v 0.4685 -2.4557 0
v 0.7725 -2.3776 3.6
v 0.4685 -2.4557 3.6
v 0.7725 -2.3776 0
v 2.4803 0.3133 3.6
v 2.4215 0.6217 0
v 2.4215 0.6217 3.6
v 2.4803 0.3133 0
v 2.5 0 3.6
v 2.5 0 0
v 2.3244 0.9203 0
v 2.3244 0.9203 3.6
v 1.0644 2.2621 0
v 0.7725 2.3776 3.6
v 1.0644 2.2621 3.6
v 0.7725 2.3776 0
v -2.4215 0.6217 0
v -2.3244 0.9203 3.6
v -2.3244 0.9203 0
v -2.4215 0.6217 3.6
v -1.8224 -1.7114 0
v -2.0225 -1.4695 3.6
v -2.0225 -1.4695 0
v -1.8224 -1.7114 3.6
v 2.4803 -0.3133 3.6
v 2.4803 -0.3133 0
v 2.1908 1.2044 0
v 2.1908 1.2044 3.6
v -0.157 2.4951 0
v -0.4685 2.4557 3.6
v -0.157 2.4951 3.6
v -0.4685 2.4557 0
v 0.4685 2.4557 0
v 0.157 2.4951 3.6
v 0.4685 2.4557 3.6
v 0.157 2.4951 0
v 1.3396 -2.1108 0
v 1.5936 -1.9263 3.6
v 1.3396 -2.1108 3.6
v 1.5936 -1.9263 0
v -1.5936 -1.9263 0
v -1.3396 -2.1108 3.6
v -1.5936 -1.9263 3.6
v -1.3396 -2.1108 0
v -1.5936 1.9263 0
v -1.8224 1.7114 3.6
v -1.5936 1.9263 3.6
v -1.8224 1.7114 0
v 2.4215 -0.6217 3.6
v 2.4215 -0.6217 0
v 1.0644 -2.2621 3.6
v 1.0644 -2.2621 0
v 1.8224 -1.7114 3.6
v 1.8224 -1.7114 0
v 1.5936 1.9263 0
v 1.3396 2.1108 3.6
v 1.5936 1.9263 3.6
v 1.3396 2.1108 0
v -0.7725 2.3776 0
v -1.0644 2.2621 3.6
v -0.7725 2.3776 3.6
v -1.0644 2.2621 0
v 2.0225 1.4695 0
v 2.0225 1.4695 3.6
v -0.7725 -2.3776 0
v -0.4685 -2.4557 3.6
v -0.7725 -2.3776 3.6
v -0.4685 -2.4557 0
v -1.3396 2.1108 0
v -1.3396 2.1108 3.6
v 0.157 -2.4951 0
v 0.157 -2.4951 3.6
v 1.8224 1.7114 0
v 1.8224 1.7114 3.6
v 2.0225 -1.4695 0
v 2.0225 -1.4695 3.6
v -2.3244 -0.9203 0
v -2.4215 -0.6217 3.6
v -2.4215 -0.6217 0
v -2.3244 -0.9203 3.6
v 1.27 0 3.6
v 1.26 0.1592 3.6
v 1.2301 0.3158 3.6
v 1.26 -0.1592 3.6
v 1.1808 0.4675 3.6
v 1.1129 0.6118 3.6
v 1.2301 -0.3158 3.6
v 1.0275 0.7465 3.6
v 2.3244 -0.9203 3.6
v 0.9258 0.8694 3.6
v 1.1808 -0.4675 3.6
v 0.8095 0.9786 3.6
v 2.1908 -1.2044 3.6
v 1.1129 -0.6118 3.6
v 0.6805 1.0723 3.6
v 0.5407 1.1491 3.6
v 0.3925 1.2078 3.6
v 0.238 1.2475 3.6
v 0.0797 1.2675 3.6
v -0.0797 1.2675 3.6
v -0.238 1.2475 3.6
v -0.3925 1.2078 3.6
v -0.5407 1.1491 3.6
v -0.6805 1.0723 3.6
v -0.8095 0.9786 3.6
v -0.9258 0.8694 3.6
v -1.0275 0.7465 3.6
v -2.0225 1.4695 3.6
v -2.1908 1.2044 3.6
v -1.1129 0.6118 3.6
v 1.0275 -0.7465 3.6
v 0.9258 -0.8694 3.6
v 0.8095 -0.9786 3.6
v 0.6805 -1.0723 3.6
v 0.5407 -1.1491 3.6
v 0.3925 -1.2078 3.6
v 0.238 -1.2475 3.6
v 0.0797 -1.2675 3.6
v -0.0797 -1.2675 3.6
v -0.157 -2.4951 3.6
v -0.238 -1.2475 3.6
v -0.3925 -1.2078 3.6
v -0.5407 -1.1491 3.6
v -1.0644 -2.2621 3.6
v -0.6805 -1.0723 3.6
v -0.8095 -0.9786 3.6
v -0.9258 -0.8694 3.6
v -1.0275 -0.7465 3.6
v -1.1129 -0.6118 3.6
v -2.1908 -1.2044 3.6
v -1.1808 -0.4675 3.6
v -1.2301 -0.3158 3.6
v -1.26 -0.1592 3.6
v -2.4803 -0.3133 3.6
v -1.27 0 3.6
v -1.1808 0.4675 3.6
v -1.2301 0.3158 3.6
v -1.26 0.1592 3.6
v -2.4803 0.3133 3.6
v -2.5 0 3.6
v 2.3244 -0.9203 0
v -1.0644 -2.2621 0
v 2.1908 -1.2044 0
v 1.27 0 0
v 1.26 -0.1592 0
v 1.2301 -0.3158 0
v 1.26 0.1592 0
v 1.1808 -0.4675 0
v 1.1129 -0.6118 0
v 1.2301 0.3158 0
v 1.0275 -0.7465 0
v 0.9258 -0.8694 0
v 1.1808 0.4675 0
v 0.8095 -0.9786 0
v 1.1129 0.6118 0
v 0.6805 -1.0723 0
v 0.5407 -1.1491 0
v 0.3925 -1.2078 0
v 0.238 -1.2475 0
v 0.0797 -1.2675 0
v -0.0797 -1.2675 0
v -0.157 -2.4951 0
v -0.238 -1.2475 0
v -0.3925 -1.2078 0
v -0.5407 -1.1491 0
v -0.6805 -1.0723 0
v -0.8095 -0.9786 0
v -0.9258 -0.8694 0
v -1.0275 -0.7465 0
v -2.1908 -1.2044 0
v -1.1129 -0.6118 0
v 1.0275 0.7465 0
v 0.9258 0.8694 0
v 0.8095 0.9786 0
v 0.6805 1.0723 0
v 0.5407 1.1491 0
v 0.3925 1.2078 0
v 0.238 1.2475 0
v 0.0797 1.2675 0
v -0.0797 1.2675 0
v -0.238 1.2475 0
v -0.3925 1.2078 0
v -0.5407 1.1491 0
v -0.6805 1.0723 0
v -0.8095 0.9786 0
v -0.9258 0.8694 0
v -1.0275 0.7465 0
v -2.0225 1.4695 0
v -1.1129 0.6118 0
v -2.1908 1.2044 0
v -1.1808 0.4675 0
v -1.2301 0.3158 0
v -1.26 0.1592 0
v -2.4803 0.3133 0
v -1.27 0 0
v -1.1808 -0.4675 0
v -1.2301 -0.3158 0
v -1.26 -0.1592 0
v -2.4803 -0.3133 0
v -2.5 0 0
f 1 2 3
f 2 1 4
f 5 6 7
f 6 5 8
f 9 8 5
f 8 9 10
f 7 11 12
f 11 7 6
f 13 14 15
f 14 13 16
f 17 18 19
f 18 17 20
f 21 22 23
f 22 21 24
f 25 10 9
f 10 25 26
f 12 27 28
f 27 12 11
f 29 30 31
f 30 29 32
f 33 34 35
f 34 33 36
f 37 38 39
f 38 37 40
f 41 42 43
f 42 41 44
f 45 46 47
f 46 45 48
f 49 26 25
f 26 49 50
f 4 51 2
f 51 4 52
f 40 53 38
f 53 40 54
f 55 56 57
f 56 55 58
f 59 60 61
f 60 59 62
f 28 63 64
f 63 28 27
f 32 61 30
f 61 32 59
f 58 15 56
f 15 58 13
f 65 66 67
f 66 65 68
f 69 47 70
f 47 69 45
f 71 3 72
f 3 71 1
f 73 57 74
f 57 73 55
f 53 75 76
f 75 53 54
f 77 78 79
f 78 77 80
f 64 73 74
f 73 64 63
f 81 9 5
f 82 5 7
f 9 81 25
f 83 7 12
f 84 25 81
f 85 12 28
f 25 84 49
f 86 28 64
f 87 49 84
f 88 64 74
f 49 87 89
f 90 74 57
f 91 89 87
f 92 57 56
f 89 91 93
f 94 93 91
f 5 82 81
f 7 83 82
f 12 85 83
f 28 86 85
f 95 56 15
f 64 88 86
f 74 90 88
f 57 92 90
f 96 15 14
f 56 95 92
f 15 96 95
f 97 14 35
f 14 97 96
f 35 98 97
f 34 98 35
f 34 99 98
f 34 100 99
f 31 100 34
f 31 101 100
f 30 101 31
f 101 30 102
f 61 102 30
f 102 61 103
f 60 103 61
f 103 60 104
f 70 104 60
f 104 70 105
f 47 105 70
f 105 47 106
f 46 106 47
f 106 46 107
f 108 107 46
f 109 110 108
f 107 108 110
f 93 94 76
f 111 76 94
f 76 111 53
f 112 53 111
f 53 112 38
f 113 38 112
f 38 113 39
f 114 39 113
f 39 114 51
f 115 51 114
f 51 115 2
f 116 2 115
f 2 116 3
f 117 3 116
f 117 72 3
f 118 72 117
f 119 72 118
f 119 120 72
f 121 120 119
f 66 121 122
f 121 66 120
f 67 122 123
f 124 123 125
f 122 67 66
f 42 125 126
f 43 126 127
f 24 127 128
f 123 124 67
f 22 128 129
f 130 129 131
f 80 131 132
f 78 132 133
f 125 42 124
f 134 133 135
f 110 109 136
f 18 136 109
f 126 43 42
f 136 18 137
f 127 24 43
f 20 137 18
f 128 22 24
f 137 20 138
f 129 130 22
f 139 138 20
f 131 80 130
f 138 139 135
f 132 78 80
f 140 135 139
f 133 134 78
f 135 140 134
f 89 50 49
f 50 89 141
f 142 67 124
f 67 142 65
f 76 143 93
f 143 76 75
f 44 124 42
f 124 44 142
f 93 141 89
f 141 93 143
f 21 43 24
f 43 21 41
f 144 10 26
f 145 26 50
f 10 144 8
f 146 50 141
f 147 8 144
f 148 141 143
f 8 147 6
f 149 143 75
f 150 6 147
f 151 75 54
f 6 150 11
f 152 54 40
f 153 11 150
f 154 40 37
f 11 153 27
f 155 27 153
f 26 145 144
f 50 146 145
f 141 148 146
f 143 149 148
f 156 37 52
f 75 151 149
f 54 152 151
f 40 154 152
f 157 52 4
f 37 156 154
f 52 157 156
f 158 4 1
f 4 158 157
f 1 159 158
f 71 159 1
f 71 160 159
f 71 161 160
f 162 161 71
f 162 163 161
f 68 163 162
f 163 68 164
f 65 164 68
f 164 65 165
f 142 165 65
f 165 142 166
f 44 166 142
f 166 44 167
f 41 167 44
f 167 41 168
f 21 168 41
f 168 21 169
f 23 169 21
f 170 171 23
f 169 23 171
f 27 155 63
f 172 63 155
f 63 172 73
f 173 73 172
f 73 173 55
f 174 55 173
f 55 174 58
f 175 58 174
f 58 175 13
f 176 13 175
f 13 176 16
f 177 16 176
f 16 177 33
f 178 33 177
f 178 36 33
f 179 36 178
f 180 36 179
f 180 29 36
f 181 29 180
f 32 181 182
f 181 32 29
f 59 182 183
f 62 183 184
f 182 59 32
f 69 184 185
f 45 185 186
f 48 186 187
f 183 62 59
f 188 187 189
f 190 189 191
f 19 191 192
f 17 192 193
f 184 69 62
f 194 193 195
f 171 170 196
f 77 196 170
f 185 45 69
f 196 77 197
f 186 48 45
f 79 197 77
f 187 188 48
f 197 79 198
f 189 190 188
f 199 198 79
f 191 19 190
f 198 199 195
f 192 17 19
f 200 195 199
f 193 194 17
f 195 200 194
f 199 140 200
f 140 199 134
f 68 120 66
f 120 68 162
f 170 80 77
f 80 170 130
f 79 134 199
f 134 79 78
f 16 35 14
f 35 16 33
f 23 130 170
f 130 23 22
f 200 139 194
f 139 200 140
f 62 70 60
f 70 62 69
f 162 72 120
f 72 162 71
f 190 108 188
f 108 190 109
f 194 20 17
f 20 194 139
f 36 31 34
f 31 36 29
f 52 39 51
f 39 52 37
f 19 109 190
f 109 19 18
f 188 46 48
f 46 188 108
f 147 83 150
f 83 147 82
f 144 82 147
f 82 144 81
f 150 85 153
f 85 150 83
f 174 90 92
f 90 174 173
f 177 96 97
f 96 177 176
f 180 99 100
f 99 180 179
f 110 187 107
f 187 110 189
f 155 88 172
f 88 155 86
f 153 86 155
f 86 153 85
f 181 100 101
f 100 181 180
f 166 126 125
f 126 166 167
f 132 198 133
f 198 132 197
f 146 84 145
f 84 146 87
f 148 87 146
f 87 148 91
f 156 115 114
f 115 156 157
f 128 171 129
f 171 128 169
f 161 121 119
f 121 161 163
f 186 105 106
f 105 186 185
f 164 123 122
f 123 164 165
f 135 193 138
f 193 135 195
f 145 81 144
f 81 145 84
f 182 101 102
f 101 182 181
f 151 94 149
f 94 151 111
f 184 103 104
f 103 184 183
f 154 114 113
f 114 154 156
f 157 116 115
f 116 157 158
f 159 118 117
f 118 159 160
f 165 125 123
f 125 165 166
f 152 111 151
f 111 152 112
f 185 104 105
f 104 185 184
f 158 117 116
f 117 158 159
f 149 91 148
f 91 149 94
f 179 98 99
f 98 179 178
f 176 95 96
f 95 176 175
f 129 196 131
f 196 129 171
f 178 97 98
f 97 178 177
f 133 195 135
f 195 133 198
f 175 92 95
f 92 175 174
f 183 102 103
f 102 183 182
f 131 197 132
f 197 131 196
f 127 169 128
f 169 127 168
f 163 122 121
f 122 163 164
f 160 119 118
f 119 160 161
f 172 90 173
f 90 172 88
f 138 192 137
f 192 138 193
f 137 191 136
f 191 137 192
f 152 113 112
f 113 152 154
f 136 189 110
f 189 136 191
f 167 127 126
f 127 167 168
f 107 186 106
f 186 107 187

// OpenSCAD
// file: board_config.scad
rail_position=20;
rail_height=2.5;
rail_width=5;
mainboard_width=60;
mainboard_height=130;
mainboard_thickness=4;
mainboard_spacing=10;
deep_holes_spacing=10;
rails=4;


board_attacher_width=4;
board_attacher_height=55;
board_attacher_length=30;

side_panel_height = board_attacher_height + 2*mainboard_thickness;
side_panel_thickness=2;
side_panel_ticks=2;

front_panel_height = board_attacher_height + 2*mainboard_thickness;
front_panel_thickness=2;
front_panel_ticks=2;
front_panel_width = mainboard_height + 2*side_panel_thickness;
// file: display_support_config.scad
display_support_thickness=3;
display_support_spacing = 3.6;
display_support_screen_height=5;
display_support_shift_x=5;
// file: dovetail.scad
module dovetail_shape(width, height, length) {
    translate([-width/2,0,0]) linear_extrude(height = length) {
        polygon([[0, 0], [width, 0], [width - width/3, height], [width/3, height]]);
    }
}

module rail(male=false, width, height, length, default_offset=0.2) {
    // male will reduce the width slightly
    offset = male ? default_offset : 0;
    
    translate([0,0,-height+offset]) rotate([90,0,0]) dovetail_shape(width-2*offset,height-offset,length);
}
// file: generic_board.scad
include <dovetail.scad>;
include <board_config.scad>;
include <common.scad>;


hole_spacing=10;
front_back_holes_depth=10;

module generic_board_attacher_mating() {
    difference() {
        cube([board_attacher_width,board_attacher_length,board_attacher_height]);
        // non attaching holes
        
        for (z=[1:board_attacher_height/(hole_spacing/2)-1]) translate([0,0,hole_spacing/2*z]) union() {
            /*for (i=[1:board_attacher_length/hole_spacing-1]) 
                translate([-margin,hole_spacing*i,0]) rotate([0,90,0]) 
                    cylinder(board_attacher_width+2*margin,d=bigscrew_diameter, $fn=50);*/
            for (i=[1:board_attacher_length/(hole_spacing/2)]) 
                translate([-margin,hole_spacing*i/2-hole_spacing/4,0]) rotate([0,90,0]) 
                    cylinder(board_attacher_width+2*margin,d=bigscrew_attach_hole_diameter, $fn=50);                
        }
        // vertical attaching holes
        for (i=[1:board_attacher_height/(hole_spacing/2)-1]) 
            union() {
                translate([board_attacher_width/2,front_back_holes_depth+margin,hole_spacing*i/2]) rotate([90,00,0]) 
                    cylinder(front_back_holes_depth+2*margin,d=bigscrew_attach_hole_diameter, $fn=50);             
                translate([board_attacher_width/2,board_attacher_length+margin,hole_spacing*i/2]) rotate([90,00,0]) 
                    cylinder(front_back_holes_depth+2*margin,d=bigscrew_attach_hole_diameter, $fn=50);             
            }
                
    }
}

module generic_board_attacher() {
    union() {
        generic_board_attacher_mating();
        translate([board_attacher_width/2,board_attacher_length,0]) rail(true, rail_width, rail_height, board_attacher_length);  
        translate([board_attacher_width/2,board_attacher_length,board_attacher_height]) rotate([0,180,0]) rail(true, rail_width, rail_height, board_attacher_length);  
    }
}

//generic_board_attacher();
// file: display.scad
include <display_config.scad>

module display_holes_row() {
    $fn=50;
    translate([display_hole_x_offset,display_hole_y_offset,-cut_limit]) cylinder(h=20,d=display_hole_size);
    translate([display_hole_x_offset,display_pcb_height-display_hole_y_offset,-cut_limit]) cylinder(h=20,d=display_hole_size);
}


module ghost_display() {
    $fn=50;
    module fakePCB() {        
        difference() {
            color([0,1.0,0]) cube([display_pcb_width,display_pcb_height, 2.00]);
            display_holes_row();
            translate([display_hole_between,0,0]) display_holes_row();
        }
    }
    
    module fakeDisplay() {
        cube([display_screen_width, display_screen_height,6.00]);
    }
    
    module fakePot() {  // Reference X is middle
        translate([-display_pot_side/2, -display_pot_side/2,0]) union() { 
        color([0,0,1.0]) cube([display_pot_side, display_pot_side, display_pot_height]);
        translate([display_pot_side/2, display_pot_side/2, display_pot_height]) cylinder(10, d=6);
        color([0,0,0,0.3]) translate([display_pot_side/2, display_pot_side/2, 12]) cylinder(10, d=25);
    }
    }

    switch_side=6;
    switch_height=4;
    bite_height=4;
    switch_round_diameter=3;
    module fakeSwitch() { // Reference X middle
        translate([-switch_side/2, 0 ,0]) union() { 
            color([0.4,0.4,0.4]) cube([switch_side,switch_side, switch_height]);
            color([0,0,0]) translate([switch_side/2, switch_side/2, switch_height]) cylinder(bite_height,d=switch_round_diameter);
    }
    }

    connector_height=9;
    module connector() {
        difference() {
            cube([21,connector_height,9]);
            translate([1,1,1+cut_limit*2]) cube([19,7,8+cut_limit]); // middle
            translate([8,-cut_limit,1+cut_limit*2])cube([5,2+cut_limit,9]); // notch
        }
    }

    sd_height=27;
    module sdCardSlot() {
        cube([17 ,27 ,3]);
    }
    
    fakePCB();
    translate([display_x_shift, display_y_shift,2.0]) fakeDisplay();
    translate([display_pot_x_shift,display_pot_y_shift, 2.0]) fakePot();
    translate([display_switch_x_shift, display_switch_y_shift,2.0]) fakeSwitch();
    translate([49,connector_height+9,0]) rotate([180,0,0]) connector();
    translate([49+21,connector_height+9,0]) rotate([180,0,0]) connector();
    translate([0,sd_height+8,0]) rotate([180,0,0]) sdCardSlot();
}


ghost_display();
// file: display_config.scad
display_pcb_height=47;
display_pcb_width=105;
display_hole_size= 3.0;
cut_limit = 1.0;

display_hole_x_offset=9;
display_hole_y_offset=3;
display_hole_between=93;

display_screen_width=57.19;
display_screen_height=37.79;
display_x_shift=13;
display_y_shift = display_pcb_height-display_screen_height-4.0;
display_holes=[[display_hole_x_offset, display_hole_y_offset],
               [display_hole_x_offset, display_pcb_height-display_hole_y_offset],
               [display_hole_between+display_hole_x_offset, display_hole_y_offset],
               [display_hole_between+display_hole_x_offset, display_pcb_height-display_hole_y_offset]];
               
display_pot_side=12;
display_pot_height=7;

display_pot_x_shift = 92.2;
display_pot_y_shift = display_pcb_height-20.66;


display_switch_x_shift= display_pot_x_shift;
display_switch_y_shift = 8.85;
// file: common.scad
inch_to_mm = 25.4;

margin=0.1;
bigscrew_attach_hole_diameter= 2.44;
bigscrew_diameter = 2.54;
bigscrew_head_diameter = 5;
bigscrew_head_height = 2.1;
// main file
include <common.scad>
include <display_config.scad>
use <display.scad>
include <generic_board.scad>
include <dovetail.scad>
include <display_support_config.scad>

module display_spacer() {
    $fn=50;
    difference() {
        cylinder(display_support_spacing, d=bigscrew_head_diameter);
        translate([0,0,-margin/2]) cylinder(display_support_spacing+margin, d=bigscrew_diameter);
    }
}

display_spacer();
